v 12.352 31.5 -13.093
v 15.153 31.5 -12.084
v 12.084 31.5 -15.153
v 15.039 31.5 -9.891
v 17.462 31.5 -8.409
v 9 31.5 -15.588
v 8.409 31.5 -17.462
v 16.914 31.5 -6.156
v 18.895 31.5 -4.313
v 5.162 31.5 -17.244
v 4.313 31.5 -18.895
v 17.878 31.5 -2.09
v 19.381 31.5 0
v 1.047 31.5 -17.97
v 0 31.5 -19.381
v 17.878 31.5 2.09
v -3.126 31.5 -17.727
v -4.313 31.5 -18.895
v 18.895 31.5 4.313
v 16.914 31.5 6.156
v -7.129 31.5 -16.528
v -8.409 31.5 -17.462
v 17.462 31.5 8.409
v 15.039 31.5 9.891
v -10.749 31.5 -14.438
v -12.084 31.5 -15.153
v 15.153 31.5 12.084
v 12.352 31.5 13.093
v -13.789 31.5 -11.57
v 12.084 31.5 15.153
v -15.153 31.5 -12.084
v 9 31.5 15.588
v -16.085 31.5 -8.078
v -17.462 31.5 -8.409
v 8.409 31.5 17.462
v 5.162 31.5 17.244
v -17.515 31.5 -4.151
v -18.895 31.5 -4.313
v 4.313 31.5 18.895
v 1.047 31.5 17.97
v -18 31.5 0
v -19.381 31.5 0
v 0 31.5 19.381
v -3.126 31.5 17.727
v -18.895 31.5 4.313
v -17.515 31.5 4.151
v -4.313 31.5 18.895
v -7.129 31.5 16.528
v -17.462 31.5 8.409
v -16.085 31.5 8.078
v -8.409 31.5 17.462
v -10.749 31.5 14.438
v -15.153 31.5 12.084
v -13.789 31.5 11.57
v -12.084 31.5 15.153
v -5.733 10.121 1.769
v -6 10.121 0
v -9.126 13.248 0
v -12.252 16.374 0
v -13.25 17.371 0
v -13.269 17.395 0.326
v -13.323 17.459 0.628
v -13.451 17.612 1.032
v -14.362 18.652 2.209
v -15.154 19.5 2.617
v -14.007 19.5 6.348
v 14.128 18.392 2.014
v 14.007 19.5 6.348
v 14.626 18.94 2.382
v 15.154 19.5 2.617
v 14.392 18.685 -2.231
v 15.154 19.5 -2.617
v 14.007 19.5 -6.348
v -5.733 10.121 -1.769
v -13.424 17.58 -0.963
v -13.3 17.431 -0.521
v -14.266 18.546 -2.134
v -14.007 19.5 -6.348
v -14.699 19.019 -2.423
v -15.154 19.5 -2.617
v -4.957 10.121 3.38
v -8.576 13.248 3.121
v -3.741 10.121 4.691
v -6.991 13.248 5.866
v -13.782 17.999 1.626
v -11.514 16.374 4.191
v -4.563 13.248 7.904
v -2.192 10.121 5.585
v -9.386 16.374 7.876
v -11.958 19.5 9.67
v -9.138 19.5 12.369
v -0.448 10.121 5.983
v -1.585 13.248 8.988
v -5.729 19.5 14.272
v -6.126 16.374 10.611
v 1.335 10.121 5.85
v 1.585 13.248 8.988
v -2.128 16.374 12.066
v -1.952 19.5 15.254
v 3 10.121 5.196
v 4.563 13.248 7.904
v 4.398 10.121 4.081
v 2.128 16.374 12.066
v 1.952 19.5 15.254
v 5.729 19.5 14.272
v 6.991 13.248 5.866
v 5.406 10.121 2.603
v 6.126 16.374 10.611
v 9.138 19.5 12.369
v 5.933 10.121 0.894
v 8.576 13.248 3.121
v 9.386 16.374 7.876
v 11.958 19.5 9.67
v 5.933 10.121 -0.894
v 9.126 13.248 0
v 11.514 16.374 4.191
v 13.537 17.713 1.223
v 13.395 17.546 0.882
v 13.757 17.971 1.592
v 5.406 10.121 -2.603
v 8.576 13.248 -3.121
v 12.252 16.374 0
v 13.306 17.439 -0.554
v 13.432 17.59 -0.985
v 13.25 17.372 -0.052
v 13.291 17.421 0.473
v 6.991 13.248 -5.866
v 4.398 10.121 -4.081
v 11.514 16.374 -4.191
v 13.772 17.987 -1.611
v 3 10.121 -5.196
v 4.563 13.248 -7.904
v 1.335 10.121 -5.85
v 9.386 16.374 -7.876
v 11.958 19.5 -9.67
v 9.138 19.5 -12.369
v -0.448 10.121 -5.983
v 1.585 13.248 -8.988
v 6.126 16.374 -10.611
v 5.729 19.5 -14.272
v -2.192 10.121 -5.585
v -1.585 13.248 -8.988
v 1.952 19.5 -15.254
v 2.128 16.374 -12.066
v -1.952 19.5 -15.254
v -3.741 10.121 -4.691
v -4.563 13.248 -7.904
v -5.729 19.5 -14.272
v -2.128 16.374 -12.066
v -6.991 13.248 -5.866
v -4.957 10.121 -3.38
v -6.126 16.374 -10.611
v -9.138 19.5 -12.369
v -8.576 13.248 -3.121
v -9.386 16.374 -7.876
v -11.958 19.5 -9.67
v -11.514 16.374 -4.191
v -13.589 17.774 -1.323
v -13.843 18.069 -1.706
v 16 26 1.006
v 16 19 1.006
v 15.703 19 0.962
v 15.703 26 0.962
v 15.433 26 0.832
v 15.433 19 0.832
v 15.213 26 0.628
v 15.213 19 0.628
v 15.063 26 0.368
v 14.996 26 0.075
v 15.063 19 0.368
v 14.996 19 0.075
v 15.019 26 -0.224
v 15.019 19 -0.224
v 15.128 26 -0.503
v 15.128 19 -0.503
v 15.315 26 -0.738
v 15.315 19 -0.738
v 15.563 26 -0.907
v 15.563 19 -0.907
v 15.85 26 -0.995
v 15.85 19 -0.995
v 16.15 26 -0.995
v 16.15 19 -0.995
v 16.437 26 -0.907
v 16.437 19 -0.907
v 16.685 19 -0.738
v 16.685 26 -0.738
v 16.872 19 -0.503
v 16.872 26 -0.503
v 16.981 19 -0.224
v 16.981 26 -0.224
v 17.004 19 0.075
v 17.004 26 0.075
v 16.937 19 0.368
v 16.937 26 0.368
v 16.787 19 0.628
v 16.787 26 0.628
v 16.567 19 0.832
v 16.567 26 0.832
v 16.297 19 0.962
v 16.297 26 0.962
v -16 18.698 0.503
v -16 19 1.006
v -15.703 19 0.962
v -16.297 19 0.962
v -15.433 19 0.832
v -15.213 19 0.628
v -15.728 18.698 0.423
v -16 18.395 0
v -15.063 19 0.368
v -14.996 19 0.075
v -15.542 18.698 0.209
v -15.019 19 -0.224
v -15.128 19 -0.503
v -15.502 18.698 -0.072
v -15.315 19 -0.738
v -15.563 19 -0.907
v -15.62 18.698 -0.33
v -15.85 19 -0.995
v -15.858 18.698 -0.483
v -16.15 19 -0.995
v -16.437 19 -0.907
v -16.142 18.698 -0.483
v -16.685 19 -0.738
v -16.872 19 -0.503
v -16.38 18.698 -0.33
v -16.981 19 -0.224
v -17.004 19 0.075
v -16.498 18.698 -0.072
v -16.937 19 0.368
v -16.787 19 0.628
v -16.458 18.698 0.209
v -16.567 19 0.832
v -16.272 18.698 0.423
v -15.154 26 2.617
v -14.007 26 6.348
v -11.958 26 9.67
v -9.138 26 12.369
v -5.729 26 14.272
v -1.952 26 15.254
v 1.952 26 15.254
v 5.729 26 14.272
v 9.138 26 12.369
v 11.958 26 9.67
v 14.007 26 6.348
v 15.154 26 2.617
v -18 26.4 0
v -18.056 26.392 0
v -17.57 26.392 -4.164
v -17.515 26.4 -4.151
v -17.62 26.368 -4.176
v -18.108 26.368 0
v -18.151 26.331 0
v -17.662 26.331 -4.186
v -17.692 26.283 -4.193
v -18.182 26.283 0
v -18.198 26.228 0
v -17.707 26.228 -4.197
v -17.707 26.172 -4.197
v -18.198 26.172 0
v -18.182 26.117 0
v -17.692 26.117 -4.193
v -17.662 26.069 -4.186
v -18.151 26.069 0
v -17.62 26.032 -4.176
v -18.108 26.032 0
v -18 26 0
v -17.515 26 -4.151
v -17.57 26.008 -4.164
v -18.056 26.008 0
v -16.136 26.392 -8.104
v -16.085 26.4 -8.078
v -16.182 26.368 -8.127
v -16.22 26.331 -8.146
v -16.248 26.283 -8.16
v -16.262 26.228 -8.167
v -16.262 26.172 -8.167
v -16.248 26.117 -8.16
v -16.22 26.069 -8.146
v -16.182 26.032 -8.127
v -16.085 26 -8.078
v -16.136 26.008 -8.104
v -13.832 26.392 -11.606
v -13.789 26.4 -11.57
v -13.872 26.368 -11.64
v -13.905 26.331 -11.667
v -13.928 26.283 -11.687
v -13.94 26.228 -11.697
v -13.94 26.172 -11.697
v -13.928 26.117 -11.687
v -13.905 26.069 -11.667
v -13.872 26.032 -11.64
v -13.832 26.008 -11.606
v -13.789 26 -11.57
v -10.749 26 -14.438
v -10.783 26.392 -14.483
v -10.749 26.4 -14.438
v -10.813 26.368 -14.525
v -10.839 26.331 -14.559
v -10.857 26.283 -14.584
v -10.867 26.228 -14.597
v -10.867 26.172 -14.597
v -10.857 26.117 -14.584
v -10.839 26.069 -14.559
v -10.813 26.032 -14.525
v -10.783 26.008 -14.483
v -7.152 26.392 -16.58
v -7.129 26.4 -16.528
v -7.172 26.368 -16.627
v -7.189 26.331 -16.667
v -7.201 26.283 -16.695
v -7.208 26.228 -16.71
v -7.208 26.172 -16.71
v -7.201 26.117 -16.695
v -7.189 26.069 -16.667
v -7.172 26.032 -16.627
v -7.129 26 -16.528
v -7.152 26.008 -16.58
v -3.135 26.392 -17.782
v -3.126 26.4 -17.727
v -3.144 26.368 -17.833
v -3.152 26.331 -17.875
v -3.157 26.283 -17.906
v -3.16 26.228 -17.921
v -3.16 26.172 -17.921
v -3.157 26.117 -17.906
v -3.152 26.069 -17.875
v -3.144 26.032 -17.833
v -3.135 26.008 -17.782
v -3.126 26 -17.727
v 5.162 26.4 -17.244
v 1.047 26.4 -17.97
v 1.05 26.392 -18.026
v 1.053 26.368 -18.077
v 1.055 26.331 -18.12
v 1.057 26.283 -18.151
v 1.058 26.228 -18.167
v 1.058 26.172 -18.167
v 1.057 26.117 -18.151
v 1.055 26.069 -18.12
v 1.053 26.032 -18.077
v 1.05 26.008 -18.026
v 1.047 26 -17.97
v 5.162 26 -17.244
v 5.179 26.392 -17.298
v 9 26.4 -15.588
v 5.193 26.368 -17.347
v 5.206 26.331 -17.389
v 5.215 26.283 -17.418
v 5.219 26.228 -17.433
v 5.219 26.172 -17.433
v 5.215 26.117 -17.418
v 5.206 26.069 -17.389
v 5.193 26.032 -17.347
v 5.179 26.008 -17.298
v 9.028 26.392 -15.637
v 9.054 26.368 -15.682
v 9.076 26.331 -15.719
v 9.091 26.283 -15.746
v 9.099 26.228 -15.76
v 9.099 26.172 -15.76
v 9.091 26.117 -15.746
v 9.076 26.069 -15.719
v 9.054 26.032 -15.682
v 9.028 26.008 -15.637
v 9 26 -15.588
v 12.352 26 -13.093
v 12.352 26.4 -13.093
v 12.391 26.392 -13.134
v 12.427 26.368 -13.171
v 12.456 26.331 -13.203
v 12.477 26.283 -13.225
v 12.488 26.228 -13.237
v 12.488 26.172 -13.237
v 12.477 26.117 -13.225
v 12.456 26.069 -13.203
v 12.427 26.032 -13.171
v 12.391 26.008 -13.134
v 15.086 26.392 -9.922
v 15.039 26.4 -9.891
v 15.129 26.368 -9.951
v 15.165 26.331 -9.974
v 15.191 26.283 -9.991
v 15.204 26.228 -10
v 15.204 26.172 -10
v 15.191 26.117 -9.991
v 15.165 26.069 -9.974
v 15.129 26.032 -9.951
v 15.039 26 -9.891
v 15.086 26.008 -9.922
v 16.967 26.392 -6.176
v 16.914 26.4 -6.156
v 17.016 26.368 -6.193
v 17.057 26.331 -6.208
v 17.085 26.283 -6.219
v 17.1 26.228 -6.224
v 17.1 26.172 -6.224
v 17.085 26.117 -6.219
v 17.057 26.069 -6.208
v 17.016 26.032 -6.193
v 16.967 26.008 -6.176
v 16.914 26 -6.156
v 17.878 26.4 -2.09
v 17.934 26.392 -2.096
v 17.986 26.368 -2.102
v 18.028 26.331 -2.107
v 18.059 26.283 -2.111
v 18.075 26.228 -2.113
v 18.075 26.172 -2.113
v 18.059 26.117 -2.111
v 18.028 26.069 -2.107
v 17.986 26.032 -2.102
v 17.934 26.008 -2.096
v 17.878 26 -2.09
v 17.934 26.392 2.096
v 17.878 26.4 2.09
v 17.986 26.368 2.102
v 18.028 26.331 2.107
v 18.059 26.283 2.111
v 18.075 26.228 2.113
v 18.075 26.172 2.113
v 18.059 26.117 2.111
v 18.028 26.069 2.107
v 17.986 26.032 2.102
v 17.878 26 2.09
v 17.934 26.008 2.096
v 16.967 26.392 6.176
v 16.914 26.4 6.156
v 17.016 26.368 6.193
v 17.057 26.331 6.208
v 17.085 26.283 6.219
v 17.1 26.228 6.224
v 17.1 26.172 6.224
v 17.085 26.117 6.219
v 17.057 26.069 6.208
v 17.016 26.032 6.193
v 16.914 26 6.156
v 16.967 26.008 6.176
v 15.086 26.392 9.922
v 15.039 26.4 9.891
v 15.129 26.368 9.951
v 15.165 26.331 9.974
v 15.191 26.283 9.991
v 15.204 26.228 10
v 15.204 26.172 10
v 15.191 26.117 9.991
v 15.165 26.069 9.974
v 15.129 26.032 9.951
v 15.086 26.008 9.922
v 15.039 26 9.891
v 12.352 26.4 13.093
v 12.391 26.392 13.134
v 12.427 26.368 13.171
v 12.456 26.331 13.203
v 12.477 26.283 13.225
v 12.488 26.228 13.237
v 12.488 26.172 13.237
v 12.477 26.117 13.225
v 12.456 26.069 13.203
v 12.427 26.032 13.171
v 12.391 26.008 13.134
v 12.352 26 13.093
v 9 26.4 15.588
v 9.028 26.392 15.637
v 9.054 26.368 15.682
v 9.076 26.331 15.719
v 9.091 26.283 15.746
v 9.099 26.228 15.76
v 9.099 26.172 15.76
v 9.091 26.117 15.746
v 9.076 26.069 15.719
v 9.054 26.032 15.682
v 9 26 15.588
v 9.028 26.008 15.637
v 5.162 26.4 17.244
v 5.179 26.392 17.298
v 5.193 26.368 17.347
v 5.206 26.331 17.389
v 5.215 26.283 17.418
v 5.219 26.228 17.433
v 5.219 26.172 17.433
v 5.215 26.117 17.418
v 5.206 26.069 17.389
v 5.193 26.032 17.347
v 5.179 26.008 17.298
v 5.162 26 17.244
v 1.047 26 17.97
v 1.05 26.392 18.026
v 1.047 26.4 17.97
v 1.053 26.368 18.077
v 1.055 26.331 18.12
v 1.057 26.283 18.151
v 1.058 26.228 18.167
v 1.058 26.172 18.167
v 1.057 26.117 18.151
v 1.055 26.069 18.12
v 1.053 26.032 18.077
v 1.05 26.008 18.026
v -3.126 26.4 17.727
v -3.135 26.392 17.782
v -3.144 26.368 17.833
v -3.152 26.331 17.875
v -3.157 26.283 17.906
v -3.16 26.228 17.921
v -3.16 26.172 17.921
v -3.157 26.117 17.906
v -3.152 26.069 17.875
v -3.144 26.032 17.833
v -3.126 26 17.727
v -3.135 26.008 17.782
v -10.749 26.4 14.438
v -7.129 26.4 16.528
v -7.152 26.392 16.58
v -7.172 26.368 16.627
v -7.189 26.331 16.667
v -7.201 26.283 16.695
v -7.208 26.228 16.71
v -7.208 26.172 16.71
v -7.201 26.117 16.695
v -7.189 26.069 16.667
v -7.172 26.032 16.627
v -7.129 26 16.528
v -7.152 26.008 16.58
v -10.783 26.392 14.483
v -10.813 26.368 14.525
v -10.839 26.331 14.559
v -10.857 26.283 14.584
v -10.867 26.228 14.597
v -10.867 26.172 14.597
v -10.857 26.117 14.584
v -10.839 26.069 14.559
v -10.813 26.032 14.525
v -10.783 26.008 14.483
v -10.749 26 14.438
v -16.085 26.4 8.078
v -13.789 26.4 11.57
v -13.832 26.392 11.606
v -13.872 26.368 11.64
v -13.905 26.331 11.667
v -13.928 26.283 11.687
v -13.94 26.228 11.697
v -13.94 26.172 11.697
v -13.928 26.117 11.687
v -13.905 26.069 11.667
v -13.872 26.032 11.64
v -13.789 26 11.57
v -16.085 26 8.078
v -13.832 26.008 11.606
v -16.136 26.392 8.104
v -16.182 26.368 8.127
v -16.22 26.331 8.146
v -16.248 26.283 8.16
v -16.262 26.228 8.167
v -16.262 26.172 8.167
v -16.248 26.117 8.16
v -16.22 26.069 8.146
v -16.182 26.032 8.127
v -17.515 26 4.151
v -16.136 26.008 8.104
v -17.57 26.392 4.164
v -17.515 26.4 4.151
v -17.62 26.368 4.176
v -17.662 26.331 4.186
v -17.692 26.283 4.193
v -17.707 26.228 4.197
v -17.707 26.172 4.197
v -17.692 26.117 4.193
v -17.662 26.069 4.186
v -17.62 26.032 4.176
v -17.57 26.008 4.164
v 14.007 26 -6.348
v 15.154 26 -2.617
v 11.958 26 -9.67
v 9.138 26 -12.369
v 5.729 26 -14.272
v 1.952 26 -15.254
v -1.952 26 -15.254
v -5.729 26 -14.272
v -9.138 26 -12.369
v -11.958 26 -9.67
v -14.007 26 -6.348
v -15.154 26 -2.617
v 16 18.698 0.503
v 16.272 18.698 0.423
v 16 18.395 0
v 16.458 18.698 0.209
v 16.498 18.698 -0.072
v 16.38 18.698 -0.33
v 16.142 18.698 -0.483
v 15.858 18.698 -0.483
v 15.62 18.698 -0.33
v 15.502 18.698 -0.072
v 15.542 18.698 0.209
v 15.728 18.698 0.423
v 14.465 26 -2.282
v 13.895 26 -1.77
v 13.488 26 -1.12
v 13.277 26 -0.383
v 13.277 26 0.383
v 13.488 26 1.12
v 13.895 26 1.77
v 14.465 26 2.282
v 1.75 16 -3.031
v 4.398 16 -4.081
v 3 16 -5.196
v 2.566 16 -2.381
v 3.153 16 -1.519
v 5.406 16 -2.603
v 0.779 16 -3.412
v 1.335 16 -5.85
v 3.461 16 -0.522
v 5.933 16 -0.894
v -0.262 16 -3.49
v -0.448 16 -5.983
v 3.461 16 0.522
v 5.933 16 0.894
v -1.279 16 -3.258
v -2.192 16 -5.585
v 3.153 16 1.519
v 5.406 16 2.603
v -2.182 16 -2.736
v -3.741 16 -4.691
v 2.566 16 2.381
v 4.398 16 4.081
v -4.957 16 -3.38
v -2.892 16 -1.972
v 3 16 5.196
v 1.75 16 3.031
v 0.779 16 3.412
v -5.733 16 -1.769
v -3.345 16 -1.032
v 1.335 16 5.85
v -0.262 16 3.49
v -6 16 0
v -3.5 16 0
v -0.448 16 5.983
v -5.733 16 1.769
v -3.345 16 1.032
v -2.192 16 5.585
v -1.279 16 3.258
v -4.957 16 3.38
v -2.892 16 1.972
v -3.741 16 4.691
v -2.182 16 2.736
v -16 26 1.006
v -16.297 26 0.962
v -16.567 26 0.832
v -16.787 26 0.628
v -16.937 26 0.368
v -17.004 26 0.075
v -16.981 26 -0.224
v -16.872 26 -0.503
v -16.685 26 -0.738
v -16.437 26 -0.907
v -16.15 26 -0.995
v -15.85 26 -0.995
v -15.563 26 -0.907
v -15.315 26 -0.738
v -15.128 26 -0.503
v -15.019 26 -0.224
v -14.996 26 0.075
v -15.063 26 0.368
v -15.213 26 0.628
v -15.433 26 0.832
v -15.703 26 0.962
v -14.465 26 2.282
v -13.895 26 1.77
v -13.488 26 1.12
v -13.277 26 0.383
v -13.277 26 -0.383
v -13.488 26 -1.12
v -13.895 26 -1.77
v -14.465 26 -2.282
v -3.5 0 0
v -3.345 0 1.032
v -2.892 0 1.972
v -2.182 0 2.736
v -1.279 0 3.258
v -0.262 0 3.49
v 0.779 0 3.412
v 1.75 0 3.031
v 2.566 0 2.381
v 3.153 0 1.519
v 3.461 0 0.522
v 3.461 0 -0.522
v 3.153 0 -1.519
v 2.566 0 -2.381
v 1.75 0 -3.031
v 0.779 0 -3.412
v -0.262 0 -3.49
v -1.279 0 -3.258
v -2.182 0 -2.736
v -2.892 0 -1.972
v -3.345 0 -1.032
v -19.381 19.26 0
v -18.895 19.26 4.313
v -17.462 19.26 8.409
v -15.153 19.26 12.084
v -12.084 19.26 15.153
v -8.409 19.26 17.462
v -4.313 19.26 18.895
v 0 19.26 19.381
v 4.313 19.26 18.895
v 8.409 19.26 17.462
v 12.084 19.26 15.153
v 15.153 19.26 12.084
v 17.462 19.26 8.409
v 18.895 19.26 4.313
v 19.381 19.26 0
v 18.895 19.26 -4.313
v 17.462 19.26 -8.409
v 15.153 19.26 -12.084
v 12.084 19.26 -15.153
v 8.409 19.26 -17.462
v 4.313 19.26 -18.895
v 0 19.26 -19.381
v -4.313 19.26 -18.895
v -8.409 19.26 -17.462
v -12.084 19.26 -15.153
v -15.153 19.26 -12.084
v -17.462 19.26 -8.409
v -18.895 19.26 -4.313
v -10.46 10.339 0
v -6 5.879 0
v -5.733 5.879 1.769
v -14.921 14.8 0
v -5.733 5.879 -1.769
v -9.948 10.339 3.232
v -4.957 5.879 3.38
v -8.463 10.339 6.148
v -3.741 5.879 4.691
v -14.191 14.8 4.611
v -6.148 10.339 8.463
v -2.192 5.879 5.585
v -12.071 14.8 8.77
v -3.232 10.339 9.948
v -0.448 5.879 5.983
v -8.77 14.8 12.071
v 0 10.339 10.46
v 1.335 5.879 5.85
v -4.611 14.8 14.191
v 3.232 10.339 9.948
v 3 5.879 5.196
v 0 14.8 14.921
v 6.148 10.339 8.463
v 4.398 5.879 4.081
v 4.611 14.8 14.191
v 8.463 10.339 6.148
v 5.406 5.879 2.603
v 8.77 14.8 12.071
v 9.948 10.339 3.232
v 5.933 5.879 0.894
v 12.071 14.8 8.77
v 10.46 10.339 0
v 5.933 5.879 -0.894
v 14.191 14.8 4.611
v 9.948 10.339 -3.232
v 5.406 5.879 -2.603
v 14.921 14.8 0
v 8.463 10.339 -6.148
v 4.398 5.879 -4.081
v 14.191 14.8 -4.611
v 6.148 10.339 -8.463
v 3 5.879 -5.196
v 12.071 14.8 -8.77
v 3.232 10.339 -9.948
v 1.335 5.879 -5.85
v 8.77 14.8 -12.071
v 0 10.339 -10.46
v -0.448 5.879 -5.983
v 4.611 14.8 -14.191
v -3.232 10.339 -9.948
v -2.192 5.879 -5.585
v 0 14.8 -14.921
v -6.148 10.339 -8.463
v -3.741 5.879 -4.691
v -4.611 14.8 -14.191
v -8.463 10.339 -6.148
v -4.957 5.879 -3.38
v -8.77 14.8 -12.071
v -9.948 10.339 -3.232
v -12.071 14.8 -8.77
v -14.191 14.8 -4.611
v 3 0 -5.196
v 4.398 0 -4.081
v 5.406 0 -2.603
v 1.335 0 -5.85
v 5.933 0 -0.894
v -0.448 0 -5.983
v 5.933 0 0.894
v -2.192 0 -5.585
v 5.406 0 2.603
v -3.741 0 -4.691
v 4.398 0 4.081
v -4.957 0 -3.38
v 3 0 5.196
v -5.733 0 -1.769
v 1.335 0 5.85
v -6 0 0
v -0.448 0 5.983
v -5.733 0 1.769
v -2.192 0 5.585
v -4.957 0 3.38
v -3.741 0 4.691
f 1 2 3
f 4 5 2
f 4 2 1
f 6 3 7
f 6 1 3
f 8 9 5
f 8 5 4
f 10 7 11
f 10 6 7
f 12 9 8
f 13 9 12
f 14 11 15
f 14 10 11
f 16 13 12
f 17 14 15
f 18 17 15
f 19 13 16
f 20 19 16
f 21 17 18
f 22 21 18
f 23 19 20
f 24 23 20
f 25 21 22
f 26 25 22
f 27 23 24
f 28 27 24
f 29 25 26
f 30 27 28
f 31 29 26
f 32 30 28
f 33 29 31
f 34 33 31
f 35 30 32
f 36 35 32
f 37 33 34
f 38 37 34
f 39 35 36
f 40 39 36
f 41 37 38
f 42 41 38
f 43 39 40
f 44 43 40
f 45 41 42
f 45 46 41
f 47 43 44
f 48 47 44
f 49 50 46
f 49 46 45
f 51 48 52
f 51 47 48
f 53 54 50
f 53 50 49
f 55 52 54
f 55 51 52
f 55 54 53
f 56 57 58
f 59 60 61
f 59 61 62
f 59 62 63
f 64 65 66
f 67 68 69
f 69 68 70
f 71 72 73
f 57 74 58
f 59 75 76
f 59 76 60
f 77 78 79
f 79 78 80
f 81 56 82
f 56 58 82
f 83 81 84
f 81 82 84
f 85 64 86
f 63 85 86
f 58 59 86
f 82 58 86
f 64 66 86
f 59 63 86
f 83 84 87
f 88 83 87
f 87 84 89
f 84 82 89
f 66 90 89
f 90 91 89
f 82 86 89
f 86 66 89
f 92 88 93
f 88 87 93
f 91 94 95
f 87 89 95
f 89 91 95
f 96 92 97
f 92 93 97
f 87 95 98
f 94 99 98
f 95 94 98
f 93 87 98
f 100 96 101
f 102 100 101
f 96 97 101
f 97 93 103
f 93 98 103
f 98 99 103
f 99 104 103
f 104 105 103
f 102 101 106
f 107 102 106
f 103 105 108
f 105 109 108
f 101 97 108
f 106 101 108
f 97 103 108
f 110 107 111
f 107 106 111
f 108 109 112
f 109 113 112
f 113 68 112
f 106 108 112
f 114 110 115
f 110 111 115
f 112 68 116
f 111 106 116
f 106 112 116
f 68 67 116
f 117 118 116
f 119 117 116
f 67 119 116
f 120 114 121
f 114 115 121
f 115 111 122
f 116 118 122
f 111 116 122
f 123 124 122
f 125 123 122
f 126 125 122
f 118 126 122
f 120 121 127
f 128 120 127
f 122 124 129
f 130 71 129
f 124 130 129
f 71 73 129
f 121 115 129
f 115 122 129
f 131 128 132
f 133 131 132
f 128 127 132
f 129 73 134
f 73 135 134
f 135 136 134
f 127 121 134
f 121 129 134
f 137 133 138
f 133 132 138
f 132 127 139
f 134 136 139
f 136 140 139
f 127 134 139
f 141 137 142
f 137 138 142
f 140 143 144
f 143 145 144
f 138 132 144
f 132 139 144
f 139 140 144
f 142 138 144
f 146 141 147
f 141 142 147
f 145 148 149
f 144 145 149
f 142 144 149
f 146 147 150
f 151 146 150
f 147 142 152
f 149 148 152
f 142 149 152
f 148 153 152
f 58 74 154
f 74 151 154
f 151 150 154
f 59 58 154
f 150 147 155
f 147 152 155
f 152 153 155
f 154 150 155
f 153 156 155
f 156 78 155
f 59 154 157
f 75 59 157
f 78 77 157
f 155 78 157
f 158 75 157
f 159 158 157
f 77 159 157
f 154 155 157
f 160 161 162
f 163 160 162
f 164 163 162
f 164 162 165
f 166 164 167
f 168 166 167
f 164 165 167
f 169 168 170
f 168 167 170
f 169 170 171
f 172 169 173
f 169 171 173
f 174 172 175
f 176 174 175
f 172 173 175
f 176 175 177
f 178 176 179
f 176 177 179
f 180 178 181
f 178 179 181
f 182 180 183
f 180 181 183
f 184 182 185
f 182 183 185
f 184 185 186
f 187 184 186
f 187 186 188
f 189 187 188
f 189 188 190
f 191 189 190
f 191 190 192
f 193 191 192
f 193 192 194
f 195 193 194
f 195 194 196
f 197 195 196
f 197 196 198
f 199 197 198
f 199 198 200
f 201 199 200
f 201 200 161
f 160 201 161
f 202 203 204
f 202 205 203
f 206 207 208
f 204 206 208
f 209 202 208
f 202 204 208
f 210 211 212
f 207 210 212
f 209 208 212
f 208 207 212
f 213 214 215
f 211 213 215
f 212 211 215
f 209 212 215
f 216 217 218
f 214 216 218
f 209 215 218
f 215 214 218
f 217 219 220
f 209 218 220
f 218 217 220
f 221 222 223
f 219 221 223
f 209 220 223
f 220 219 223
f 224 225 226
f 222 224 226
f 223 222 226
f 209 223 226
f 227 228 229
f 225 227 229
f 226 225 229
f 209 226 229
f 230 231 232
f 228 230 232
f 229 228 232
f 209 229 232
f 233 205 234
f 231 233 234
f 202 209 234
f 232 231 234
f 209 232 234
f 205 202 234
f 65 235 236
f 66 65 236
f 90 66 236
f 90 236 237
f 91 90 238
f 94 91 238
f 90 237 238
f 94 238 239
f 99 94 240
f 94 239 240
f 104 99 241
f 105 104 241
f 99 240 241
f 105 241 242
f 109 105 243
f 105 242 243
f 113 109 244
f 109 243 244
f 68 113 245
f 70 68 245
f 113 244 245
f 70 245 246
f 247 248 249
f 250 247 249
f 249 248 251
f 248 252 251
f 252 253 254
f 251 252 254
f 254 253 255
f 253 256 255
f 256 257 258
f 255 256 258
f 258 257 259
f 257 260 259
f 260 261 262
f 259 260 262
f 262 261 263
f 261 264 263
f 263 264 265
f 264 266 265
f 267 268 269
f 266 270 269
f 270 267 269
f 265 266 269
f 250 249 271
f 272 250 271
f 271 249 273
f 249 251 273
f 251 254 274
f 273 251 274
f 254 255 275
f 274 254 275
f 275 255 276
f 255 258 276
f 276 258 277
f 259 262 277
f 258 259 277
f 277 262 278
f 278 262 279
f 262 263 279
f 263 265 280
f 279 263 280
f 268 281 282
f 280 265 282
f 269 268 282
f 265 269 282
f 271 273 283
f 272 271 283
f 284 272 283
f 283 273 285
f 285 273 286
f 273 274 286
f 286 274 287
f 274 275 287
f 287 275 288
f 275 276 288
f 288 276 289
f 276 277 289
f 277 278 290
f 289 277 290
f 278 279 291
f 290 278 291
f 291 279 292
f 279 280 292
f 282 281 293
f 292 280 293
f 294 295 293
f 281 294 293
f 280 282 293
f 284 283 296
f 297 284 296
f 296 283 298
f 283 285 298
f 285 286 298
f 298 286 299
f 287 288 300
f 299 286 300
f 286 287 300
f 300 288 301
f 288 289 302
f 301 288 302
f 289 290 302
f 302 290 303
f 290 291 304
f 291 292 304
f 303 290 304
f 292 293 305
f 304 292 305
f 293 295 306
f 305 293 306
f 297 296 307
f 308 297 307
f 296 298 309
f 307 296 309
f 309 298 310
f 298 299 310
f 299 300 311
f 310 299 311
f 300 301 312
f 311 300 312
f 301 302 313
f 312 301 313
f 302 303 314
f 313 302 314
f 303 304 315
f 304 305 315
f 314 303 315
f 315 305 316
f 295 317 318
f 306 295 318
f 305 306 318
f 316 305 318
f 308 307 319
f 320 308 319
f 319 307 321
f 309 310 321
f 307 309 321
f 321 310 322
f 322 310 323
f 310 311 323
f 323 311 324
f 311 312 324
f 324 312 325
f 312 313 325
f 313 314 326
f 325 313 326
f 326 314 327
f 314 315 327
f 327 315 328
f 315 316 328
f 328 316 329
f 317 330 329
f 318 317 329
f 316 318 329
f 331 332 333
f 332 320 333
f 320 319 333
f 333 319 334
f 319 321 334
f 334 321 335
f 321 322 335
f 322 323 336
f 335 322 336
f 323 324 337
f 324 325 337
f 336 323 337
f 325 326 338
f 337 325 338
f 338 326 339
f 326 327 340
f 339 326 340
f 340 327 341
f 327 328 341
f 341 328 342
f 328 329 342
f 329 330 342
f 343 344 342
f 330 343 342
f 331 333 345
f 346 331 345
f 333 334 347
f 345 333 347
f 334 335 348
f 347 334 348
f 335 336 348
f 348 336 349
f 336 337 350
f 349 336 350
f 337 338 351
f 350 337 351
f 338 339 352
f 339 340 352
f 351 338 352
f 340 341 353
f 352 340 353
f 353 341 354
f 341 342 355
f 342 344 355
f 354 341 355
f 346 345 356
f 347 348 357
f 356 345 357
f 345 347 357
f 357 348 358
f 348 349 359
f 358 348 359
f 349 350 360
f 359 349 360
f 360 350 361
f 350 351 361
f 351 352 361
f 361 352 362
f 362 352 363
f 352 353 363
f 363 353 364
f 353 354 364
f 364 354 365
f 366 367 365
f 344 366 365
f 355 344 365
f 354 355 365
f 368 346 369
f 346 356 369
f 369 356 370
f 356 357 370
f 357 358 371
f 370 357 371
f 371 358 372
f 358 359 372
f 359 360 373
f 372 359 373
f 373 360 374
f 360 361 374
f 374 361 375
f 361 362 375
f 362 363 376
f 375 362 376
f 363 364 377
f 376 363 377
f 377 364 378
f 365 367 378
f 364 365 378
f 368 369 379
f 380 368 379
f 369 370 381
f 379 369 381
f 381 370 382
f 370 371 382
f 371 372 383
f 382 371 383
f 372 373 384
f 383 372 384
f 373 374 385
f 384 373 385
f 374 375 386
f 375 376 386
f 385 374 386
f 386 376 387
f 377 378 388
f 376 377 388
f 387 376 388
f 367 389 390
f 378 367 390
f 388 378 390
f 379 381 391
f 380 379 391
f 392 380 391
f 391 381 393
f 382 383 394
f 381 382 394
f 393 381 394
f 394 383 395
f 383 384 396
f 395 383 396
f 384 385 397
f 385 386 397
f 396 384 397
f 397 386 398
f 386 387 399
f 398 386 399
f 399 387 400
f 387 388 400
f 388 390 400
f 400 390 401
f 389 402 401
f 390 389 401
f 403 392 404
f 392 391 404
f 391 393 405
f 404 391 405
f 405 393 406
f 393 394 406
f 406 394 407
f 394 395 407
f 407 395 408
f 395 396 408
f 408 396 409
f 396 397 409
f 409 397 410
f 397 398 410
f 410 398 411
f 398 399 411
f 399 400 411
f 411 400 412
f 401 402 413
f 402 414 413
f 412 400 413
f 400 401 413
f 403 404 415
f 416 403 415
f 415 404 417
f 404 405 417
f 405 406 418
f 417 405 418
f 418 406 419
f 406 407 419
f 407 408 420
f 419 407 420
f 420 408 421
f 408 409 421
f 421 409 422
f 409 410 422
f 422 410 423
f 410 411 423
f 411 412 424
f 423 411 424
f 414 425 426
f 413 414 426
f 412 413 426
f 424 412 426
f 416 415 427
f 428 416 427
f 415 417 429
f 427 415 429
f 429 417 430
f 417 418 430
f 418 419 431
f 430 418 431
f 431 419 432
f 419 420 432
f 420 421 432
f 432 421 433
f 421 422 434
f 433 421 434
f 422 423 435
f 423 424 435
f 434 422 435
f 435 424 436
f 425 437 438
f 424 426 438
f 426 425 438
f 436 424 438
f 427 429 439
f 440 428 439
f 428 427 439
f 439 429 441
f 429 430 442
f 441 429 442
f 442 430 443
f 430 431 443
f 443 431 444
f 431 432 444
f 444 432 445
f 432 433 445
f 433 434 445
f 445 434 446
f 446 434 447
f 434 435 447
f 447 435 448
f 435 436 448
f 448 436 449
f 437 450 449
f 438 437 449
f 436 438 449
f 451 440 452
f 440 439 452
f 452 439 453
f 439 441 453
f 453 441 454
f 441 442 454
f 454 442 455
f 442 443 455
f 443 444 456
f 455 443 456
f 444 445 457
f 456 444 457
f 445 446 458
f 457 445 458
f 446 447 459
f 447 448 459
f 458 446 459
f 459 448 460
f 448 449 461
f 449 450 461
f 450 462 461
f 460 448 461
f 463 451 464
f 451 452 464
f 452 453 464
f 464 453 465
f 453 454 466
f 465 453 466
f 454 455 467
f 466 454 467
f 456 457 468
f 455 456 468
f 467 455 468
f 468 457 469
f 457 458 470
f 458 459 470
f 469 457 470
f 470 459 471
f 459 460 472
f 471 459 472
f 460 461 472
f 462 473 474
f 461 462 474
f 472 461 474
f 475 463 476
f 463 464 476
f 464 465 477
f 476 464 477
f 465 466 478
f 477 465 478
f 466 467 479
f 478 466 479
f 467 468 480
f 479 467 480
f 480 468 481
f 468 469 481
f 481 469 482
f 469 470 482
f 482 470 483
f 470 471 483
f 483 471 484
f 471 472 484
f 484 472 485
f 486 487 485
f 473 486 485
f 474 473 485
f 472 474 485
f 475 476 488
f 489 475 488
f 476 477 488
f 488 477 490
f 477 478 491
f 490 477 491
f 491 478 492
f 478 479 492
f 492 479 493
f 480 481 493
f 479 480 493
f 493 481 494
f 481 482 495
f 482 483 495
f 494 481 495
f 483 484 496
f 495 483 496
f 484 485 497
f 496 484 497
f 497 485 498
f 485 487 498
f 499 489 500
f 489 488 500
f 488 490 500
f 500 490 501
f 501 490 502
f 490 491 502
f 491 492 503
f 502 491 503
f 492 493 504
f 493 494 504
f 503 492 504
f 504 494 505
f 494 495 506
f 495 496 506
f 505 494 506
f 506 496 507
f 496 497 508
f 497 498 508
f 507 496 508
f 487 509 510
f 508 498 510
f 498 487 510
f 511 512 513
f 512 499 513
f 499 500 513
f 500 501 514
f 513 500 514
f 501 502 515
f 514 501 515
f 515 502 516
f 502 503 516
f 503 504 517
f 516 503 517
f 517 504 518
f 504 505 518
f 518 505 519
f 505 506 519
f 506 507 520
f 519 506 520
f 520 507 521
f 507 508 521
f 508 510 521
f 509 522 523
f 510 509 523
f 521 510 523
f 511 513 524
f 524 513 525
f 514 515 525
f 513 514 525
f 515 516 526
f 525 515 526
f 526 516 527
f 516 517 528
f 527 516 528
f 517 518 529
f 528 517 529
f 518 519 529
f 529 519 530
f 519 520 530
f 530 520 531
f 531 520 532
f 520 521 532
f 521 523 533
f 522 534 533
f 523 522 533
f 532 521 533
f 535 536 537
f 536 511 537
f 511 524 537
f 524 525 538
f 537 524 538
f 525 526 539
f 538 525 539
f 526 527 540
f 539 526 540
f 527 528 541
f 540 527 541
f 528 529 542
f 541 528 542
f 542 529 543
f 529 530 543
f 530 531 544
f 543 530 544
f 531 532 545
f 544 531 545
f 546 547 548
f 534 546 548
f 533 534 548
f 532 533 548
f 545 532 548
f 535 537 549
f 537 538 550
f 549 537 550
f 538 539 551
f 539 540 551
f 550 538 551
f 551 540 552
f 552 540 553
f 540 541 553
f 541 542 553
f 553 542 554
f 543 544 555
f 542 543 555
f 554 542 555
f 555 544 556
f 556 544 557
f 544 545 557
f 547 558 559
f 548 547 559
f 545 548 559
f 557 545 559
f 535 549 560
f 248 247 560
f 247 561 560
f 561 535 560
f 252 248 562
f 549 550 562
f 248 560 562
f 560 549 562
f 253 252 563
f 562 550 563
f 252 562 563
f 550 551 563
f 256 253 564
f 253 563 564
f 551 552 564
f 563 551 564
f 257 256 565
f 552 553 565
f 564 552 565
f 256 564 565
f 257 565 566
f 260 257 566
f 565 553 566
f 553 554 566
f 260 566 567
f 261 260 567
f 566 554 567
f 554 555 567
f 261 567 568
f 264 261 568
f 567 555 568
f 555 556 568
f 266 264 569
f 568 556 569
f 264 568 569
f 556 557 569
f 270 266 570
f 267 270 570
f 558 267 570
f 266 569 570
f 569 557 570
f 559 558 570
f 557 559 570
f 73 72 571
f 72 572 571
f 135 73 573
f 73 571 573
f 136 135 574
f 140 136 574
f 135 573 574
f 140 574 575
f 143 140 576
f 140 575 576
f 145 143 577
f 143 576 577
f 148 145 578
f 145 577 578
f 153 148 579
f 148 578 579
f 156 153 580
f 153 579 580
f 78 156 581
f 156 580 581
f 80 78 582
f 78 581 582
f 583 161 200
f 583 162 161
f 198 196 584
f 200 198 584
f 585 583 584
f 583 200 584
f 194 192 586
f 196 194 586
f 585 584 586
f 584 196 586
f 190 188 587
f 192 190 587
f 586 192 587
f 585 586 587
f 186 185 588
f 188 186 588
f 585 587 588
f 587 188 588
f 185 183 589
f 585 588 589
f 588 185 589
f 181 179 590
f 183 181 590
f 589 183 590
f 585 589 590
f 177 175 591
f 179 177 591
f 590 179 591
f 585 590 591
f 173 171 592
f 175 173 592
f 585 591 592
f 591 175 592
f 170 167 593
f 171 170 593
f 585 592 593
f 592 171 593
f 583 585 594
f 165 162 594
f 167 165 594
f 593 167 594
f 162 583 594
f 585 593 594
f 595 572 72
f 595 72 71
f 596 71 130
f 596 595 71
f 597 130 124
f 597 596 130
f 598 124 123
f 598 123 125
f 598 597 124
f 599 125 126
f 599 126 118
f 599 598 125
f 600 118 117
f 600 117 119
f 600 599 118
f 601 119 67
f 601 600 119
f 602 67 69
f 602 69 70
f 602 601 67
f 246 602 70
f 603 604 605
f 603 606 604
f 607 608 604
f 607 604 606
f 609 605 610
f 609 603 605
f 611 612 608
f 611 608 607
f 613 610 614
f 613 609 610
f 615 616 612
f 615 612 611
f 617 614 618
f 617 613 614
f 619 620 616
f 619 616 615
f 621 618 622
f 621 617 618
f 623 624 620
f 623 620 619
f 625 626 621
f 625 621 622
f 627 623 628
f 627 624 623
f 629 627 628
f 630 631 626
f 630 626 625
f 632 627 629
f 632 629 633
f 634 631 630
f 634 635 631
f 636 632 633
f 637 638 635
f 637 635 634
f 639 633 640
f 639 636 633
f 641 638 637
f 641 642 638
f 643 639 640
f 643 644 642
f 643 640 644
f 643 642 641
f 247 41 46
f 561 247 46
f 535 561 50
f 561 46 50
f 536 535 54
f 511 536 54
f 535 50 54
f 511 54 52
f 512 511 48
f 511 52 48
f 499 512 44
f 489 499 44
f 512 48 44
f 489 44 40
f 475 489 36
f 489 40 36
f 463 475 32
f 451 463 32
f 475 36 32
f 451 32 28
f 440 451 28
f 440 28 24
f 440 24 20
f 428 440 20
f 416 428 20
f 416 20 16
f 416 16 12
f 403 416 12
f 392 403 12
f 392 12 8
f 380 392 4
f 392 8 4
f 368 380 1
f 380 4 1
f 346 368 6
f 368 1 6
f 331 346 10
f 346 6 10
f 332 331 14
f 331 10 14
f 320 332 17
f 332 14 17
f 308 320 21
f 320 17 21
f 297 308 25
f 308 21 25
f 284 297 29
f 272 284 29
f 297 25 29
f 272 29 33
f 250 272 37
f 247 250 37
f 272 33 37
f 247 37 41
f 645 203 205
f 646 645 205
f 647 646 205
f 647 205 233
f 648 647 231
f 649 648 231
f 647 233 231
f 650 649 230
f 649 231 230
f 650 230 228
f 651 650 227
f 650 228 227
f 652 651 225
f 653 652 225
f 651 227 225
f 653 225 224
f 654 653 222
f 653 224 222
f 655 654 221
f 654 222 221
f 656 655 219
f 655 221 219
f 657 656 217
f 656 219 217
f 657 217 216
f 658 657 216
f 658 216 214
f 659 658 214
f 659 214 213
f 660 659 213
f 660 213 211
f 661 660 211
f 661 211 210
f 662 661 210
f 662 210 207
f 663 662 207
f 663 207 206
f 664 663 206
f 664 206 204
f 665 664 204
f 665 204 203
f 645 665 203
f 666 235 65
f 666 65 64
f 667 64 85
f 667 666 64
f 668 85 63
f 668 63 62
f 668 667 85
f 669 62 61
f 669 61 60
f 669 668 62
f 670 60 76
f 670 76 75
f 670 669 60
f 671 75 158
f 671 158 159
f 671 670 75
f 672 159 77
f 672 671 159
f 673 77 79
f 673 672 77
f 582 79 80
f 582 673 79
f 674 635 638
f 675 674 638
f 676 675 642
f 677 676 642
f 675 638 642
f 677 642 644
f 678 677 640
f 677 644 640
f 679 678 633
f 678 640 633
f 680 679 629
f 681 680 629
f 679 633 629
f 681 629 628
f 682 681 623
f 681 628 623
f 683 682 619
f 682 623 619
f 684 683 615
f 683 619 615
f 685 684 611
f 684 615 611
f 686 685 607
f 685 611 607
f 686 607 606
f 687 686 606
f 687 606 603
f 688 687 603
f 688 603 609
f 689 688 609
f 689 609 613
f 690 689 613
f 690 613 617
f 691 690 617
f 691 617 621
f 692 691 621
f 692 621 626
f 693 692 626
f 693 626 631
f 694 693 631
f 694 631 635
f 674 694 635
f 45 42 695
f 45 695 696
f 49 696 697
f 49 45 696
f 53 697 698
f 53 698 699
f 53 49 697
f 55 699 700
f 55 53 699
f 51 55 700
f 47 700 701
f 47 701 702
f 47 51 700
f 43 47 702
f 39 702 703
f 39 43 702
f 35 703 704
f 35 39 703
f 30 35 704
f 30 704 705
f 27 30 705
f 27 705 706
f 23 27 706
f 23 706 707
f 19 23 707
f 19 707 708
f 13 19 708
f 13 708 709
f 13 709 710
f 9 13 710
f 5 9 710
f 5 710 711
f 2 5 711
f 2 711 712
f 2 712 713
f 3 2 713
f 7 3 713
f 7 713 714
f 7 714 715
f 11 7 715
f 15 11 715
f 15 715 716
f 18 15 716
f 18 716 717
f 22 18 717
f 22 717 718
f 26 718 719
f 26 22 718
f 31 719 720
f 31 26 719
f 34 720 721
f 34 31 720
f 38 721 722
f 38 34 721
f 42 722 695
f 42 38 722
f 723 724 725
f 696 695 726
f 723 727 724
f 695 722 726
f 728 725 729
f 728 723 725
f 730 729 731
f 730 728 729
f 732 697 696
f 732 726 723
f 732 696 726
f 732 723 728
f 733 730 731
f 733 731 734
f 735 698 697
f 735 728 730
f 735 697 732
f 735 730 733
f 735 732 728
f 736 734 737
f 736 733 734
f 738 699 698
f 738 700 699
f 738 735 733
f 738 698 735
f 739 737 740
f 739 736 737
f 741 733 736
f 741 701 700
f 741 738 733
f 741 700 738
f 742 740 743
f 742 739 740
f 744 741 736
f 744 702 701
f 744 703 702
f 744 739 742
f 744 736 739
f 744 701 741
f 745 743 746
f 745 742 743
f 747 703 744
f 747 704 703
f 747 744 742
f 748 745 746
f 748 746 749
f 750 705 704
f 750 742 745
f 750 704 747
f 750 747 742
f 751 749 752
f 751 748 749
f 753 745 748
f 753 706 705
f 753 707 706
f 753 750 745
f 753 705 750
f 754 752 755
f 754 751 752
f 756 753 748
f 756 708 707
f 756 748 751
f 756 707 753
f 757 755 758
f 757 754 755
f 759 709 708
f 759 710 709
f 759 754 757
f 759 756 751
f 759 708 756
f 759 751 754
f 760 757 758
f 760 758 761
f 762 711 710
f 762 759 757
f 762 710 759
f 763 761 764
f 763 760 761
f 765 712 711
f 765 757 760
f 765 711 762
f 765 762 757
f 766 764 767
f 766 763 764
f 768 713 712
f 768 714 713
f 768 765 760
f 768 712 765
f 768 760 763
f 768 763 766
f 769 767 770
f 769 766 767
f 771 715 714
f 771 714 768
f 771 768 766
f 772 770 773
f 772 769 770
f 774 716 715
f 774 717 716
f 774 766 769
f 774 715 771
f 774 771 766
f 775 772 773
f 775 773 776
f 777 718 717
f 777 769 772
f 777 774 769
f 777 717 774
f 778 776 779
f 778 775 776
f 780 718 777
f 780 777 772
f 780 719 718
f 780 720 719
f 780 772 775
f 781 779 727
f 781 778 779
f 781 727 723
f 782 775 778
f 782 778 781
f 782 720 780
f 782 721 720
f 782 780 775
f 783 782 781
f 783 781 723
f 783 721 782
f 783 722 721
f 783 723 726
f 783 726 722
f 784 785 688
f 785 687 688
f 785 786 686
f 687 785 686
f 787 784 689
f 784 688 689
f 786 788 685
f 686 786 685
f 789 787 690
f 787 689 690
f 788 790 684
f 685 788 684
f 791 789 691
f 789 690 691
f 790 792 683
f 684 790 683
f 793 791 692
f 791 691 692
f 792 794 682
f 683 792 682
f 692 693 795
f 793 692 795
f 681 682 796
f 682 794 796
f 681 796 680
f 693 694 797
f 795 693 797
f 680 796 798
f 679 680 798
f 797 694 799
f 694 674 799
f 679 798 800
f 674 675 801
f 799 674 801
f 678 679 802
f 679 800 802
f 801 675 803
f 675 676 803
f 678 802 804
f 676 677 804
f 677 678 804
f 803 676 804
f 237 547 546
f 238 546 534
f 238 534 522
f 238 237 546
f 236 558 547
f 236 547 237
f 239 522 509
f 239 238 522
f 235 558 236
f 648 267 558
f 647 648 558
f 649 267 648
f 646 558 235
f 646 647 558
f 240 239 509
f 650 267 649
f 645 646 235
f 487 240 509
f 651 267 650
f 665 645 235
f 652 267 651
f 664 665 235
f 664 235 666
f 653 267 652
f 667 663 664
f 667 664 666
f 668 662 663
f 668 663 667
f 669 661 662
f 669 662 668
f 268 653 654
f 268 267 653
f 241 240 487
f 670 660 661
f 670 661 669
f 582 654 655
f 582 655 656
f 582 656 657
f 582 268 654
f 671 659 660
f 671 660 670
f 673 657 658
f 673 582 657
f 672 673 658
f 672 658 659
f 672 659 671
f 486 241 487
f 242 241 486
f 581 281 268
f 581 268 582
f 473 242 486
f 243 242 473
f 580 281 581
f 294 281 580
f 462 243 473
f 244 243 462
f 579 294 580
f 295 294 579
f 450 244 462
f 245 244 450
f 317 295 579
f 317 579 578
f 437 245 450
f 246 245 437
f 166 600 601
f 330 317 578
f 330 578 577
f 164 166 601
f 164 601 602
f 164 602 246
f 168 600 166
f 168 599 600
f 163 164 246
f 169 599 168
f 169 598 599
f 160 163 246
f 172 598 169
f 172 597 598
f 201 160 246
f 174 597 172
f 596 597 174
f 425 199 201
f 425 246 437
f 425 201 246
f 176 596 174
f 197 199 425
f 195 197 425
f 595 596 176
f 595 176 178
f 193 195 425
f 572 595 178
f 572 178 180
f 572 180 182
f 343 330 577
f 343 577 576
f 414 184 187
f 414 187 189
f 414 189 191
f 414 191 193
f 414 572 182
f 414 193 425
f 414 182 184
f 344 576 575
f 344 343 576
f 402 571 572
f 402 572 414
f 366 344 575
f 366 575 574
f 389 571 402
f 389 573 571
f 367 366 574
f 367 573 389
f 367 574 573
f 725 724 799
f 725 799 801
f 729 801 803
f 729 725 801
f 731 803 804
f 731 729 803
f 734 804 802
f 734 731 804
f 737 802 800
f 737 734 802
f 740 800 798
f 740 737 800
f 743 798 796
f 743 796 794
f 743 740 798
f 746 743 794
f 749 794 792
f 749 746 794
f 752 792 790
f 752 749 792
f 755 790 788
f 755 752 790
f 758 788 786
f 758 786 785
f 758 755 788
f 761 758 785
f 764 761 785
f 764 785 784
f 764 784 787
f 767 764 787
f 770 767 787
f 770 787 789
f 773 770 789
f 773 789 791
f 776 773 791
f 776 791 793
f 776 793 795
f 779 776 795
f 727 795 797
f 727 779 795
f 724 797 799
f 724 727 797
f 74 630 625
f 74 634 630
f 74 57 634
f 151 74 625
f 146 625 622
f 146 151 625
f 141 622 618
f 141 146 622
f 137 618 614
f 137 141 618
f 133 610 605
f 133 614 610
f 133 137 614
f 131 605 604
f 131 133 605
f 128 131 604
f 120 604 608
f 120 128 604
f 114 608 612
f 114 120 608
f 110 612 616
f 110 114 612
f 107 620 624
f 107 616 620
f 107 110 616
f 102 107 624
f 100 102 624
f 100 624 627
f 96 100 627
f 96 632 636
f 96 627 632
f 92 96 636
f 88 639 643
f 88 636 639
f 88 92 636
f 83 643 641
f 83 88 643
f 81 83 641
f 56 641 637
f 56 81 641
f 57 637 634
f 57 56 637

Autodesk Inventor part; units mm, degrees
ref_plane "YZ Plane" through (0, 0, 0) normal (1, 0, 0) x (0, 1, 0)
ref_plane "XZ Plane" through (0, 0, 0) normal (0, 1, 0) x (-1, 0, 0)
sketch "Sketch1" plane through (0, 0, 0) normal (0, 0, 1) x (1, 0, 0)
  line L0 (0, 0) -> (0, 8)
  line L1 (-3.5, 0) -> (-3.5, 16)
  line L2 (-3.5, 16) -> (-6, 16)
  line L3 (-6, 16) -> (-6, 10.1213)
  line L4 (-6, 10.1213) -> (-15.3787, 19.5)
  line L5 (-3.5, 0) -> (-6, 0)
  line L6 (-6, 0) -> (-6, 5.8787)
  line L7 (-6, 5.8787) -> (-19.3813, 19.26)
  line L8 (-19.3813, 19.26) -> (-19.3813, 31.5)
  line L9 (-19.3813, 31.5) -> (-18, 31.5)
  line L10 (-6, 10.1213) -> (-6, 5.8787)
  line L11 (-6, 8) -> (0, 8)
  line L12 (-15.3787, 19.5) -> (-15.3787, 26)
  line L13 (-15.3787, 26) -> (-18, 26)
  line L14 (-18, 26) -> (-18, 31.5)
  dimension "d0" = 7
  dimension "d1" = 12
  dimension "d2" = 45
  dimension "d3" = 16
  dimension "d5" = 12.24
  dimension "d6" = 3
  dimension "d7" = 31.5
  dimension "d8" = 8
  dimension "d28" = 36
  dimension "d29" = 12
  dimension "d30" = 6.5
revolve "Revolution1" add sketch "Sketch1" angle 360 about axis through (0, 0, 0) along (0, 1, 0)
ref_plane "Work Plane1" through (0, 26, 0) normal (0, 1, 0) x (1, 0, 0)
sketch "Sketch2" plane through (0, 26, 0) normal (0, 1, 0) x (1, 0, 0)
  circle A0 centre (-16, 0) radius 2.75
  line L0 (0, 0) -> (0, 15.3787)
  circle A1 centre (0, 0) radius 15.3787 projected
  circle A2 centre (16, 0) radius 2.75
  point P0 (15.1544, 2.6168)
  point P1 (15.1544, -2.6168)
  point P2 (-15.1544, 2.6168)
  point P3 (-15.1544, -2.6168)
  point P4 (-15.1544, 2.6168)
  point P5 (-15.1544, -2.6168)
  dimension "d11" = 32
  dimension "d12" = 5.5
  dimension "d35" = 5.2335
extrude "Extrusion1" add sketch "Sketch2" against normal up to surface contours A0 A1 | A2 A1 picked at (-14.6525, 0) picked at (14.7143, -0.6004)
sketch "Sketch3" plane through (0, 26, 0) normal (0, 1, 0) x (1, 0, 0)
  arc A0 (-15.1544, -2.6168) -> (-15.1544, 2.6168) centre (-16, 0) ccw projected
  arc A1 (15.1544, 2.6168) -> (15.1544, -2.6168) centre (16, 0) ccw projected
  point P0 (0, 0)
  point P1 (-17.8887, -1.9989)
  point P2 (-17.8887, 1.9989)
  point P3 (17.8887, 1.9989)
  point P4 (17.8887, -1.9989)
sketch "Sketch4" plane through (0, 0, 0) normal (0, 0, 1) x (1, 0, 0)
  circle A0 centre (-18, 26.2) radius 0.2
  line L0 (0, 25.76) -> (0, 31.5)
  line L1 (18, 26) -> (-18, 26) projected
  line L2 (-18, 31.5) -> (-18, 26) projected
  point P0 (0, 0)
  point P1 (-15.1544, 26)
  dimension "d15" = 0.4
revolve "Revolution2" cut sketch "Sketch4" angle 360 about axis through (0, 25.76, 0) along (0, 1, 0)
hole "Hole1" at (-16, 26, 0) at (16, 26, 0) direction (0, -1, 0) diameter 2.013 depth 7 tip angle 118 thread size "M2.5x0.45" class "6H" standard "ANSI Metric M Profile"
sketch "Sketch7" plane through (0, 31.5, 0) normal (0, 1, 0) x (1, 0, 0)
  line L0 (31.4446, -31.0263) -> (0, -31.0263)
  line L1 (0, -31.0263) -> (0, 28.9425)
  line L2 (0, 28.9425) -> (31.4446, 28.9425)
  line L3 (31.4446, 28.9425) -> (31.4446, -31.0263)
  point P0 (0, 0)
properties part number "18102021-002-08" material "Stainless Steel"
